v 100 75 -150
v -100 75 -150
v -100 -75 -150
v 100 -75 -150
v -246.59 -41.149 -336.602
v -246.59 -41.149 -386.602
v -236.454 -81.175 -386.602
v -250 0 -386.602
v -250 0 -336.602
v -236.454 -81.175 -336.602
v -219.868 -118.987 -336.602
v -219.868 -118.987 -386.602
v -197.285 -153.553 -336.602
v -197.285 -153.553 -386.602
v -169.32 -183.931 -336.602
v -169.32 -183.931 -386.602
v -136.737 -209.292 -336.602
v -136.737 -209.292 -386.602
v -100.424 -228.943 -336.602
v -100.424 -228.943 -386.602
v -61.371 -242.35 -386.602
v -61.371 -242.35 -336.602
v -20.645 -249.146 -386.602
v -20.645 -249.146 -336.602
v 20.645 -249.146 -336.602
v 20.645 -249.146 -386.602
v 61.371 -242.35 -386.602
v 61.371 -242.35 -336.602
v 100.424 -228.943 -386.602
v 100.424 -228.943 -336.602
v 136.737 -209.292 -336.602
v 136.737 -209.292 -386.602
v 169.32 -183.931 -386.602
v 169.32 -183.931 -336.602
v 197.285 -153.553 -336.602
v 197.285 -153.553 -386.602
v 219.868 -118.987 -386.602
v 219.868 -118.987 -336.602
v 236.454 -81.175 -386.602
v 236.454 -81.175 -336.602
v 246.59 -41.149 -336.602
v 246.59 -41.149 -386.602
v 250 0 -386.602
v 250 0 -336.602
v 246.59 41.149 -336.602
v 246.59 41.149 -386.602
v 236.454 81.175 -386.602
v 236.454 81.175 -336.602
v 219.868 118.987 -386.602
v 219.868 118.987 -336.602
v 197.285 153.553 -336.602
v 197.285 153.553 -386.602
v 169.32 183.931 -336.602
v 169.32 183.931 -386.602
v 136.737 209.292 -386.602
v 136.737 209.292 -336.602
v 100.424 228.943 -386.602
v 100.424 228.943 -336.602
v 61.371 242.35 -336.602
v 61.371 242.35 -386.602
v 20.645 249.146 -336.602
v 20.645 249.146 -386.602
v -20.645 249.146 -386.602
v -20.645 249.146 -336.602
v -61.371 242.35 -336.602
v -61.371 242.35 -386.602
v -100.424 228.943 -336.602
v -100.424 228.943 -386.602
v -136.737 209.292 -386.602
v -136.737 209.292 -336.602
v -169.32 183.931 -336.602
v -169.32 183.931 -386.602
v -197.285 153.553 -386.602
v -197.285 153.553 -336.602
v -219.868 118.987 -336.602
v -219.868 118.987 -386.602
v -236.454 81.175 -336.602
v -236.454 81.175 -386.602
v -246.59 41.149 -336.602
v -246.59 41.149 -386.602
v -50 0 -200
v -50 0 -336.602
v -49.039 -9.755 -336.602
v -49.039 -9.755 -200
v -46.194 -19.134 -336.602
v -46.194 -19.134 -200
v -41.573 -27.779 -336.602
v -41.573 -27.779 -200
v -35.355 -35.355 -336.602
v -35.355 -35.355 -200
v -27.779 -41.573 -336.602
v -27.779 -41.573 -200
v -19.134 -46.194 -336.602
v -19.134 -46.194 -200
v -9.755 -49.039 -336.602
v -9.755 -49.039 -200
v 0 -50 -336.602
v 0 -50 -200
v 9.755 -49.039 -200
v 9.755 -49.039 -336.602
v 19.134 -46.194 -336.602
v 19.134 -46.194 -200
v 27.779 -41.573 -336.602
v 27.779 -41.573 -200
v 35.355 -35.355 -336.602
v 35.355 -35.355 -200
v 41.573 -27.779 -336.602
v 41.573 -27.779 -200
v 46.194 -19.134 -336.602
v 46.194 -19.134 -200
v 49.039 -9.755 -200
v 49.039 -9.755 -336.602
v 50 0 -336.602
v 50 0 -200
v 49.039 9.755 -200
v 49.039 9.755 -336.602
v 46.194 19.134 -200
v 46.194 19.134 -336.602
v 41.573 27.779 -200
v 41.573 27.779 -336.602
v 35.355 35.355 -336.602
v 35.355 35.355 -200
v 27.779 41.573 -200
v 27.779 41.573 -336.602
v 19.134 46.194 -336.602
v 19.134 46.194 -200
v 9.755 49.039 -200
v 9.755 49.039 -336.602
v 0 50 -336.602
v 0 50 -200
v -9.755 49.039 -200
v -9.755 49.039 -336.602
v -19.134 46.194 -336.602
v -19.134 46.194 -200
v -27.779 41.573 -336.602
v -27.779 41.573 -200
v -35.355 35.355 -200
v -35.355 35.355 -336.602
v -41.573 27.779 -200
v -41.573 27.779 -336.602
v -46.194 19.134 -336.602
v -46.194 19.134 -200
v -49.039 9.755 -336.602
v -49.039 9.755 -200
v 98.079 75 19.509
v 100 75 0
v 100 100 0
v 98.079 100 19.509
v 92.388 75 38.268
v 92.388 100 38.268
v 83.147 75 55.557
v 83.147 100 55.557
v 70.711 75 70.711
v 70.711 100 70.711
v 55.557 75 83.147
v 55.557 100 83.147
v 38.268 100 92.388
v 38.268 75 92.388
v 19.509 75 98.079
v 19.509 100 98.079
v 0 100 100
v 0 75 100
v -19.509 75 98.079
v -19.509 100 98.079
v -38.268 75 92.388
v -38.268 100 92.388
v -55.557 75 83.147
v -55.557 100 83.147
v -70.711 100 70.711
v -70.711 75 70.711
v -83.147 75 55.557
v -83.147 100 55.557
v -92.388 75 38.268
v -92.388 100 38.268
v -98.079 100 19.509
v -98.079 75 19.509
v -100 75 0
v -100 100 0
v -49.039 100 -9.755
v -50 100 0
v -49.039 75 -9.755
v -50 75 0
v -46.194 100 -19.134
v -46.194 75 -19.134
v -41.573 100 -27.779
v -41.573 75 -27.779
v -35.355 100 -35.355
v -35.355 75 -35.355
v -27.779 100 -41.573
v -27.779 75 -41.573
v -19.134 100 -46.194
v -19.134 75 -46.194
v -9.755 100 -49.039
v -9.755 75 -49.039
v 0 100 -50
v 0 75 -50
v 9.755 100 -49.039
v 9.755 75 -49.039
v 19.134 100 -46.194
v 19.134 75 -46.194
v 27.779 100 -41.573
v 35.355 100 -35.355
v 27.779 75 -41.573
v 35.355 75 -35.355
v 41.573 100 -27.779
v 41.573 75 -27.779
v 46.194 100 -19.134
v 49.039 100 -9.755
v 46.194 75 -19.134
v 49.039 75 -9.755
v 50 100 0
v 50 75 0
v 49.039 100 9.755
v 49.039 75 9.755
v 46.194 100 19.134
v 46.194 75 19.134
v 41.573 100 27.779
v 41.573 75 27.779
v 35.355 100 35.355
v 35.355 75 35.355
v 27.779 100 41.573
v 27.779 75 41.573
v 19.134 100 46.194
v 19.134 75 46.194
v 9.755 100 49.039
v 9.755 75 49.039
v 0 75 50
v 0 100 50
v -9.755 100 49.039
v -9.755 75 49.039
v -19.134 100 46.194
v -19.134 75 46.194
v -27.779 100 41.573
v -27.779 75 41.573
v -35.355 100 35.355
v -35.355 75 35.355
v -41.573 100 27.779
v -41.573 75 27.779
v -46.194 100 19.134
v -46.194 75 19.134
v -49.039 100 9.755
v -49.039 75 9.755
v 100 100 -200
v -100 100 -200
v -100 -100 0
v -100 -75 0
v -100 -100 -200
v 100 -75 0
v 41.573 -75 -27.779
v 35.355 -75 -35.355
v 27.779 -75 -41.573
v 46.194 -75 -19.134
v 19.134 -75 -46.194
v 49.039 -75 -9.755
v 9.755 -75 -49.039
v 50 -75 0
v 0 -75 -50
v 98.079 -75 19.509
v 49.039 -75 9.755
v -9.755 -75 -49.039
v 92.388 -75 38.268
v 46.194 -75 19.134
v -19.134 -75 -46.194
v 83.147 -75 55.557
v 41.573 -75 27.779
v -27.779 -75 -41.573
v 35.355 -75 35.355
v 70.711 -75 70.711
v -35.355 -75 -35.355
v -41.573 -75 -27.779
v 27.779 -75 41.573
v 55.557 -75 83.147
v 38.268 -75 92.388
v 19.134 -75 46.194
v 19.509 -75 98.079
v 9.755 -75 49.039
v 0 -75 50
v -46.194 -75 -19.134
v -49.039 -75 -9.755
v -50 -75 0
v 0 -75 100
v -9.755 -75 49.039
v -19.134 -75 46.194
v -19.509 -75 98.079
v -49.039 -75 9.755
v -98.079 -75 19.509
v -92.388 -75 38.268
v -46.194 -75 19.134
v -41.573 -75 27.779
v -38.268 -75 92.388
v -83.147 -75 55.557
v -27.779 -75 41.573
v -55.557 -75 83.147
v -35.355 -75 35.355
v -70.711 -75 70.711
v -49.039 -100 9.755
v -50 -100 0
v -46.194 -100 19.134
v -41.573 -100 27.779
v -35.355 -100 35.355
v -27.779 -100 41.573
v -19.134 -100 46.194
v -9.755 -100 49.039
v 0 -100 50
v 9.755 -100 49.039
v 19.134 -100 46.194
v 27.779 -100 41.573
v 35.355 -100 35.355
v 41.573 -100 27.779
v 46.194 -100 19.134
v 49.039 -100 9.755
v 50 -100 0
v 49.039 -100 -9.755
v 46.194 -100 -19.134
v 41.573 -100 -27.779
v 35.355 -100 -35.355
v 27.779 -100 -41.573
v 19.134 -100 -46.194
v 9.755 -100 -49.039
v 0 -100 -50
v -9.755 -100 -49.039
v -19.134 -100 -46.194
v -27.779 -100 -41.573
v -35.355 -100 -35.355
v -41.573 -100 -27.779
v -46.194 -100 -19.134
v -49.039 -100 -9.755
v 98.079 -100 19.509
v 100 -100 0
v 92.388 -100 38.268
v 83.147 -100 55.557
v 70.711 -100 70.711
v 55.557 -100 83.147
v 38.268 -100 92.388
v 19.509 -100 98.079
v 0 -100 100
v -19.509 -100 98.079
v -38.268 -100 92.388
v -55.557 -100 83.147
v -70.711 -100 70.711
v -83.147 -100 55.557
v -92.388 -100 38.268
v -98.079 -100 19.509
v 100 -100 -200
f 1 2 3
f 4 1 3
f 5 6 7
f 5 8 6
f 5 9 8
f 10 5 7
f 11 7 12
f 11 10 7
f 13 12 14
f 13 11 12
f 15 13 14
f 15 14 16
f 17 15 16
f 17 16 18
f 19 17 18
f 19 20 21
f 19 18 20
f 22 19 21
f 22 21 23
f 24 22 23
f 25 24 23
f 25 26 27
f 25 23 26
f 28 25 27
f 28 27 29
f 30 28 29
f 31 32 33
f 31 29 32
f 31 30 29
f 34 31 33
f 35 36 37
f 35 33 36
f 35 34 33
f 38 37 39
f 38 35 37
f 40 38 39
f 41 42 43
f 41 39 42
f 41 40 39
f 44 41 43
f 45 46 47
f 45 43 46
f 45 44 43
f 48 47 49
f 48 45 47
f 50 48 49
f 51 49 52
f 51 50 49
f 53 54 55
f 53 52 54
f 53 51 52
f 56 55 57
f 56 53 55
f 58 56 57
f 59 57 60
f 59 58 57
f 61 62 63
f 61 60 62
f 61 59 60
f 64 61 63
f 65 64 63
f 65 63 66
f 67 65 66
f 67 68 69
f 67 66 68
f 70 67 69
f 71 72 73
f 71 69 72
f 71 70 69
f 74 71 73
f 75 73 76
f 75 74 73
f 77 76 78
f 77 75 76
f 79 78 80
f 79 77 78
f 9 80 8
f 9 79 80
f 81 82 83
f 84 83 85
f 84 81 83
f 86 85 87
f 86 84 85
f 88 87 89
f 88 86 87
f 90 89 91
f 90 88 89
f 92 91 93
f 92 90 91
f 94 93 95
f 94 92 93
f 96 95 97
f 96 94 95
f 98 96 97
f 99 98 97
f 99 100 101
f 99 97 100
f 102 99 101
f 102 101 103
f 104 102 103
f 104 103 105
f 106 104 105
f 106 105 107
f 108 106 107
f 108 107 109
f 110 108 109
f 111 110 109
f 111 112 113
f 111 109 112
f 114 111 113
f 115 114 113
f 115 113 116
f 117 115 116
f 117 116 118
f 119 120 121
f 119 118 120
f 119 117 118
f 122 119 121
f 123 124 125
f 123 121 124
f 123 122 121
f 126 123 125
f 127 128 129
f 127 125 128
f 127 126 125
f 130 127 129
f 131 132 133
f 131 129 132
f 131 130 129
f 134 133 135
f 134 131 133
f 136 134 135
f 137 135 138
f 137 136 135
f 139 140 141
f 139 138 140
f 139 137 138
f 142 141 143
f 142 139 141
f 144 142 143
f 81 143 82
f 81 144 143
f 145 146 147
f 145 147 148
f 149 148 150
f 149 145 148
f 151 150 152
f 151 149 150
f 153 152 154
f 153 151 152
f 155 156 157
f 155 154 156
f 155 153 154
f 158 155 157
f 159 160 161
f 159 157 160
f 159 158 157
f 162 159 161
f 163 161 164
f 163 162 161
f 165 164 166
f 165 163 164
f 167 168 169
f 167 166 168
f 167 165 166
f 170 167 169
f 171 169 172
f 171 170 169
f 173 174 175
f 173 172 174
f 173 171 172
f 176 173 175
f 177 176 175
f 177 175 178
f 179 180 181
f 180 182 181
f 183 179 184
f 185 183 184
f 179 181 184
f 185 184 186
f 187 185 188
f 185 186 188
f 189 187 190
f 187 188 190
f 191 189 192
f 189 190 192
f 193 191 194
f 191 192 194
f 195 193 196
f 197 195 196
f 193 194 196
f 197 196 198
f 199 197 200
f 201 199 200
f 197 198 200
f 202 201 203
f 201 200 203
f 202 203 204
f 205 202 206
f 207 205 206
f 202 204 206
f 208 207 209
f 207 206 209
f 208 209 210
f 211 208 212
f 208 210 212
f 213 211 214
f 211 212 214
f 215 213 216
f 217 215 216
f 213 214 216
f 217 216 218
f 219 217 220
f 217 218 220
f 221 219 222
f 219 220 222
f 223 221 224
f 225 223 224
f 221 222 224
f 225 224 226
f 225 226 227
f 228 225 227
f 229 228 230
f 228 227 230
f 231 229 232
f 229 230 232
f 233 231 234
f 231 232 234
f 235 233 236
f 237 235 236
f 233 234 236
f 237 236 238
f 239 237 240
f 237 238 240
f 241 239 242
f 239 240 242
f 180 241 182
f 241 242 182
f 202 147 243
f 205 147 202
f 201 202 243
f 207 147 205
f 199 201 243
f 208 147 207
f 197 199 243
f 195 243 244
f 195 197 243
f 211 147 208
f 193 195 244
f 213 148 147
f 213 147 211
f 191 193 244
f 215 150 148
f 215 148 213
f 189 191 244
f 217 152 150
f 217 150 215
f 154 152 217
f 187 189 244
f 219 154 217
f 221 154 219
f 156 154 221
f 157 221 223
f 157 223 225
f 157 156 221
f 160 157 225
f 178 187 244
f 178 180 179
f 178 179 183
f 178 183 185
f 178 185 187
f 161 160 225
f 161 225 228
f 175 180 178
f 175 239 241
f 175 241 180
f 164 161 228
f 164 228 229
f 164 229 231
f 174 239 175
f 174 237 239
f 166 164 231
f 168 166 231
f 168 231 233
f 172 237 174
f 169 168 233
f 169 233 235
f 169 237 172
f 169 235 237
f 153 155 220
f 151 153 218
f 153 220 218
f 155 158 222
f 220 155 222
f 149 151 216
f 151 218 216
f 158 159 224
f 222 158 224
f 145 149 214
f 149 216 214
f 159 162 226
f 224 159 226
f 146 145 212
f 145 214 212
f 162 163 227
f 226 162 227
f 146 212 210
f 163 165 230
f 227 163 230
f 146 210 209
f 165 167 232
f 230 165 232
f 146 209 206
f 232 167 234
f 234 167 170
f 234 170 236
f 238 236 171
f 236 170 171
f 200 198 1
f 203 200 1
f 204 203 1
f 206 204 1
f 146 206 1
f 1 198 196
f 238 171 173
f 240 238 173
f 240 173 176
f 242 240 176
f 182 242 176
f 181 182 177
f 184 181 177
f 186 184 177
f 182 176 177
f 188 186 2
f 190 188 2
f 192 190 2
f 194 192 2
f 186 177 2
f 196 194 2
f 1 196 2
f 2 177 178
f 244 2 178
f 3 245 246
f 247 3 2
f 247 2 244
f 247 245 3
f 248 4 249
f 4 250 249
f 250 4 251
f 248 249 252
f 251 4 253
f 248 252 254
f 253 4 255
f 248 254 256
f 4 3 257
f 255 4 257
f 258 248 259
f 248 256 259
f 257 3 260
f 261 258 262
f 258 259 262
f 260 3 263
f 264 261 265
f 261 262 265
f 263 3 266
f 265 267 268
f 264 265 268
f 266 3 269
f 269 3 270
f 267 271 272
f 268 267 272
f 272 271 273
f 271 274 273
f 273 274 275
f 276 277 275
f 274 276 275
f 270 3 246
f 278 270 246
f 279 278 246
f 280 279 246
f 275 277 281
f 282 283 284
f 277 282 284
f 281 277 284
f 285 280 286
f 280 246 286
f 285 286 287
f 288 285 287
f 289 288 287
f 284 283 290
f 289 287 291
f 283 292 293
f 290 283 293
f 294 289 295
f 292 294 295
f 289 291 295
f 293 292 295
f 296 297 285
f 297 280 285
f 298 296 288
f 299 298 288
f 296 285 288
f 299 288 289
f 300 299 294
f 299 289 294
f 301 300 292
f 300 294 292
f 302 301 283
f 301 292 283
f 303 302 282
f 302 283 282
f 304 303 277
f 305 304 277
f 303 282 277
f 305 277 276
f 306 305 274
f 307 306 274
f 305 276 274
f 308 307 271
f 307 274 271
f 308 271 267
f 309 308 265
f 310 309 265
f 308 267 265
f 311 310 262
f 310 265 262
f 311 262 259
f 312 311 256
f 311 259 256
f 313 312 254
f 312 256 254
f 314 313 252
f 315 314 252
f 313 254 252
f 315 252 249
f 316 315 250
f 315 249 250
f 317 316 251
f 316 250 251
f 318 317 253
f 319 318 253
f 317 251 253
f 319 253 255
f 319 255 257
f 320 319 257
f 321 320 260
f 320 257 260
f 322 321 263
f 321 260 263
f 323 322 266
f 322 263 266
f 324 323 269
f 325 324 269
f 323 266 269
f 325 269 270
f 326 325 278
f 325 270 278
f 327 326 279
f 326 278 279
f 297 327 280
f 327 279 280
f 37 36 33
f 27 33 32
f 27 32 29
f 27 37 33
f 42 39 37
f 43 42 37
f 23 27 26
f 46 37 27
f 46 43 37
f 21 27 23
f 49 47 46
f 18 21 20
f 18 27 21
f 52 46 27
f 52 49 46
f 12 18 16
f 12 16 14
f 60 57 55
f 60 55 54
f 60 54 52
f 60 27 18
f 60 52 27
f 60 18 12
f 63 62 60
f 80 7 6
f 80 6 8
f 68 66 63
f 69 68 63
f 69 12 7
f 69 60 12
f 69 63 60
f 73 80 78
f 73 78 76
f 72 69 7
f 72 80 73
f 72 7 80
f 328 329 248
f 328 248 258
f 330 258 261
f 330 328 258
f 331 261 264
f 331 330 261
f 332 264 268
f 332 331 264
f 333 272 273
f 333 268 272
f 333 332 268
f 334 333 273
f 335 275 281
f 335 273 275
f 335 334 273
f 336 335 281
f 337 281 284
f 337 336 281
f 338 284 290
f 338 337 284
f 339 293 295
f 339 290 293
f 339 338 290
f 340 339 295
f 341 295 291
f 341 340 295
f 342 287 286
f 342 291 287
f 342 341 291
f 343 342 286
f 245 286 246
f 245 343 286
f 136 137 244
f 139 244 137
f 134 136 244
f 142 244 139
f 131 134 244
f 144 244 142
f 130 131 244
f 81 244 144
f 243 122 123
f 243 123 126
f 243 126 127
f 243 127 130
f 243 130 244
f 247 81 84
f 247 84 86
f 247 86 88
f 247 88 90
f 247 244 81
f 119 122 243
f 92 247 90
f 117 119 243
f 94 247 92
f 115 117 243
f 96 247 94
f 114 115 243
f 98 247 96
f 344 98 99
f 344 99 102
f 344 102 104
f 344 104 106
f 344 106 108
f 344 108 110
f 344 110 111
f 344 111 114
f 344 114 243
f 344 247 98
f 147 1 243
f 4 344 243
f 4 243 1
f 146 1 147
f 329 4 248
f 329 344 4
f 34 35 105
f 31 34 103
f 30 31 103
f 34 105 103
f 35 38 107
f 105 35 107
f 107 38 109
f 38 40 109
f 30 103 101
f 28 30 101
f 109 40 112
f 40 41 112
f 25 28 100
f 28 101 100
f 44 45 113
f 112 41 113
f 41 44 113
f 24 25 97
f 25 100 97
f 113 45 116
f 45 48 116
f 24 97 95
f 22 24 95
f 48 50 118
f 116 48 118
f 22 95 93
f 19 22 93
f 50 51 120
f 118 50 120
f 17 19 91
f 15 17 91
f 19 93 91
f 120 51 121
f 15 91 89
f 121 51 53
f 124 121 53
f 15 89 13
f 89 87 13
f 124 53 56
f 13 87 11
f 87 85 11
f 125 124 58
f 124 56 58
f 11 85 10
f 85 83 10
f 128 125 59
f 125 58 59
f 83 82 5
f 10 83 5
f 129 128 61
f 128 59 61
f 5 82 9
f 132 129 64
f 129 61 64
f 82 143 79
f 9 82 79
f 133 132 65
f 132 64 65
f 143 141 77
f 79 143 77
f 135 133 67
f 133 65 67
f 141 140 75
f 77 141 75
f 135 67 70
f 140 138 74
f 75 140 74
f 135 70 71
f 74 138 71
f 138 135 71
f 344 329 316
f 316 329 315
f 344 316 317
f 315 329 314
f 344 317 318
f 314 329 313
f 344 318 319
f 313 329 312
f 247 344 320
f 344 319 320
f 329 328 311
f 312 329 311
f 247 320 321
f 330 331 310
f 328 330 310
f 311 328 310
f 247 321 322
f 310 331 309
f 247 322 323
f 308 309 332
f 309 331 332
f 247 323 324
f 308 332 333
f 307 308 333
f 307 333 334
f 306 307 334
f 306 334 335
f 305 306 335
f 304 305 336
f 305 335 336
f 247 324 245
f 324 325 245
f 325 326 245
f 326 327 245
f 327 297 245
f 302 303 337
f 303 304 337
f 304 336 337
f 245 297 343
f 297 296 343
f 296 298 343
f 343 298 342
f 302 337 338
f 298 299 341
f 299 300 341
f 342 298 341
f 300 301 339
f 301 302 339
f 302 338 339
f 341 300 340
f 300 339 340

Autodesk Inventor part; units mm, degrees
ref_plane "YZ Plane" through (0, 0, 0) normal (1, 0, 0) x (0, 1, 0)
ref_plane "XZ Plane" through (0, 0, 0) normal (0, 1, 0) x (-1, 0, 0)
ref_plane "XY Plane" through (0, 0, 0) normal (0, 0, 1) x (1, 0, 0)
sketch "Sketch2" plane through (0, 0, 0) normal (0, 1, 0) x (-1, 0, 0)
  line L0 (0, 143.7774) -> (0, -86.6025) construction
  line L1 (190.8875, 0) -> (-168.3726, 0)
  arc A0 (50, -86.6025) -> (0, 100) centre (0, 0) ccw construction
  line L2 (0, 0) -> (0, -86.6025) construction
  line L3 (0, -386.6025) -> (250, -386.6025)
  line L4 (250, -386.6025) -> (250, -336.6025)
  line L5 (250, -336.6025) -> (50, -336.6025)
  line L6 (50, -336.6025) -> (50, -86.6025)
  line L7 (0, 0) -> (0, 100) construction
  line L8 (50, -86.6025) -> (0, -86.6025)
  line L9 (0, -86.6025) -> (0, -95.5661) construction
  line L10 (0, -86.6025) -> (0, -386.6025)
  dimension "d0" = 100
  dimension "ht" = 250
  dimension "base_thick" = 50
  dimension "base_radius" = 250
  dimension "d11" = 50
revolve "Revolution2" add sketch "Sketch2" angle 360 about axis through (0, 0, 143.7774) along (0, 0, -1)
sketch "Sketch3" plane through (0, 0, 0) normal (0, 1, 0) x (-1, 0, 0)
  line L0 (68.3369, 0) -> (-71.9882, 0)
  line L1 (0, 52.8788) -> (0, -69.4874)
  arc A0 (100, 0) -> (-100, 0) centre (0, 0) ccw
  line L2 (100, 0) -> (100, -200)
  line L3 (100, -200) -> (-100, -200)
  line L4 (-100, -200) -> (-100, 0)
  dimension "d26" = 100
  dimension "d27" = 200
extrude "Extrusion1" add sketch "Sketch3" along normal mid plane 200
sketch "Sketch4" plane through (0, 0, 0) normal (0, 1, 0) x (-1, 0, 0)
  circle A0 centre (0, 0) radius 50
  dimension "d30" = 50
extrude "Extrusion2" cut sketch "Sketch4" along normal through all both and the other way through all
sketch "Sketch5" plane through (0, 0, 0) normal (1, 0, 0) x (0, 1, 0)
  line L0 (75, -150) -> (-75, -150)
  line L1 (-75, -150) -> (-75, 100)
  line L2 (-75, 100) -> (75, 100)
  line L3 (75, 100) -> (75, -150)
  line L4 (0, -62.7821) -> (0, 60)
  line L5 (91.6333, 0) -> (-95.5004, 0)
  line L6 (0, -400) -> (0, 300) construction
  point P0 (0, 0)
  dimension "d35" = 75
  dimension "d36" = 100
  dimension "d39" = 150
extrude "Extrusion3" cut sketch "Sketch5" along normal through all both and the other way through all
equation "\"d0\" = S_radius"
equation "\"ht\" = 5 * rod_radius"
equation "\"base_thick\" = rod_radius"
equation "\"base_radius\" = 5 * rod_radius"
equation "\"d11\" = rod_radius"
equation "\"d26\" = S_radius"
equation "\"d27\" = 2 * S_radius"
equation "\"d28\" = 2 * S_radius"
equation "\"d30\" = rod_radius"
equation "\"d35\" = 1.5 * rod_radius"
equation "\"d36\" = S_radius"
equation "\"d39\" = 1.5 * S_radius"
equation "\"rod_radius\" = 50"
equation "\"S_radius\" = 2 * rod_radius"
properties part number "FP"
